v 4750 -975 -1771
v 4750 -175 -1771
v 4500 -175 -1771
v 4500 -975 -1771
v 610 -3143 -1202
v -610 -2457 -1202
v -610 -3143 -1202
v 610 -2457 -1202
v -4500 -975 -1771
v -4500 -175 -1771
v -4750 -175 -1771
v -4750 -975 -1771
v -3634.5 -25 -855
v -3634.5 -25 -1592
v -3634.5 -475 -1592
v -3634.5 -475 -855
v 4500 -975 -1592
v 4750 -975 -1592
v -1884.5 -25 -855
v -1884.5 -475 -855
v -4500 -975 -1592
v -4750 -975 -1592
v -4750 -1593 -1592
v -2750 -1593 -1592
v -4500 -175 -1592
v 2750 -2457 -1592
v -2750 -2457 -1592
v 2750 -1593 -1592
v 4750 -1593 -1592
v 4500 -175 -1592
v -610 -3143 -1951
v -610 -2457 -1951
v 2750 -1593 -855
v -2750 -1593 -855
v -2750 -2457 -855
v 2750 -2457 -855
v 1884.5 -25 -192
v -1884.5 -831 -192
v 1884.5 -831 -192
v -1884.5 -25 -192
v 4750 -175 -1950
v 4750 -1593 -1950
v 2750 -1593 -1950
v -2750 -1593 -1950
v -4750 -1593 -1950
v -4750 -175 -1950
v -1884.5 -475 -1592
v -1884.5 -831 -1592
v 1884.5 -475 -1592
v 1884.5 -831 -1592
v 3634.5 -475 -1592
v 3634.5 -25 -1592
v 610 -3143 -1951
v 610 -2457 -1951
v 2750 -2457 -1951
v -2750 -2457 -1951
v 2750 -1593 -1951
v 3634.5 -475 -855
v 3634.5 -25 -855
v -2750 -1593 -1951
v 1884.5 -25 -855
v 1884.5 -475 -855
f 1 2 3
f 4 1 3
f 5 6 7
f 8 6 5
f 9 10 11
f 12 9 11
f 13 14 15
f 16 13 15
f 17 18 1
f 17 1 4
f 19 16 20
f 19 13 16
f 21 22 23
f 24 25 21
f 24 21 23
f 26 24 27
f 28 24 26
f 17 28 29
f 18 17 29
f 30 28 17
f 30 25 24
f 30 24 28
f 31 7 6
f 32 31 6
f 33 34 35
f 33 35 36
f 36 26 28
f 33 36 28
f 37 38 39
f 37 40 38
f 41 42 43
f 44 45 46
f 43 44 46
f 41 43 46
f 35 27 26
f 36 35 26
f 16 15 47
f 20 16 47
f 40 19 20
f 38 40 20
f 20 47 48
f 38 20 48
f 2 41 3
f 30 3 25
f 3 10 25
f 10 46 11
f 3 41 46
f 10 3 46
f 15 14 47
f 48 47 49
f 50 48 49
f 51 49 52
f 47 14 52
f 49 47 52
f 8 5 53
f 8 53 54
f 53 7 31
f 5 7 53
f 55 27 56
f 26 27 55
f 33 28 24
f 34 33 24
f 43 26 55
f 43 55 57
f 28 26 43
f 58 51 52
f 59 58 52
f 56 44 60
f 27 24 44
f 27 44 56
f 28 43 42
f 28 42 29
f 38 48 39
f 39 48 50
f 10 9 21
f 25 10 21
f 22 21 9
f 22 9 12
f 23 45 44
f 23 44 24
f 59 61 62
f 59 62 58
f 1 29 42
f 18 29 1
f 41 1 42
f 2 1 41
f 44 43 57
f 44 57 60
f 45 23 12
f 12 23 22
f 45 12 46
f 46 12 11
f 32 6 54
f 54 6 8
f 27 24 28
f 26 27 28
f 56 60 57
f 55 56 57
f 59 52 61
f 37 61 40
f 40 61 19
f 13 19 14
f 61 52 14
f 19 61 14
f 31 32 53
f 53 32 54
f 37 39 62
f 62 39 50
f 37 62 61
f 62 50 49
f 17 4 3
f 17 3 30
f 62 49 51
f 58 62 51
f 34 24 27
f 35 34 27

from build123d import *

# Parameters (mm, degrees)
F0_W      = 1418
F0_H      = 358
F1_DEPTH  = 4750
F4_DEPTH  = 1400
F5_DEPTH  = 737
F3_W      = 1220
F3_H      = 686
F6_DEPTH  = 390
F7_DEPTH  = 359
F8_DEPTH  = 359
F10_W     = 250
F10_H     = 179
F11_DEPTH = 800
F3_W_2    = 1750
F3_H_2    = 450
F3_H_3    = 300
F3_H_4    = 150
F12_DEPTH = 737


with BuildPart() as f1:
    # F0 (on Right) → F1 (new body)
    with BuildSketch(Plane.YZ):
        with Locations((-884, -1771)):
            Rectangle(F0_W, F0_H)
    extrude(amount=-F1_DEPTH)


with BuildPart() as f2_1:
    # F2: instance of F1
    add(f1.part.mirror(Plane(origin=(0, -884, -1771), x_dir=(0, 1, 0), z_dir=(1, 0, 0))))


with BuildPart() as f4:
    # F3 (on face) → F4 (new body)
    with BuildSketch(Plane.XY.offset(-1592)):
        Polygon((0, -175), (-1884.5, -175), (-1884.5, -475), (-1884.5, -831), (0, -831), align=None)
        Polygon((1884.5, -475), (1884.5, -25), (-1884.5, -25), (-1884.5, -175), (0, -175), (0, -831), (1884.5, -831), align=None)
    extrude(amount=F4_DEPTH)

    # F3 (on face) → F12 (join)
    with BuildSketch(Plane.XY.offset(-1592)):
        with Locations((2759.5, -250)):
            Rectangle(F3_W_2, F3_H_2)
        with Locations((-2759.5, -325)):
            Rectangle(F3_W_2, F3_H_3)
        with Locations((-2759.5, -100)):
            Rectangle(F3_W_2, F3_H_4)
    extrude(amount=F12_DEPTH)


with BuildPart() as f5:
    # F3 (on face) → F5 (new body)
    with BuildSketch(Plane.XY.offset(-1592)):
        Polygon((2750, -1593), (0, -1593), (-2750, -1593), (-2750, -2457), (-610, -2457), (610, -2457), (2750, -2457), align=None)
    extrude(amount=F5_DEPTH)


with BuildPart() as f6:
    # F3 (on face) → F6 (new body)
    with BuildSketch(Plane.XY.offset(-1592)):
        with Locations((0, -2800)):
            Rectangle(F3_W, F3_H)
    extrude(amount=F6_DEPTH)

    # F3 (on face) → F7 (join)
    with BuildSketch(Plane.XY.offset(-1592)):
        with Locations((0, -2800)):
            Rectangle(F3_W, F3_H)
    extrude(amount=-F7_DEPTH)


with BuildPart() as f1_1:
    add(f1.part)

    add(f2_1.part)  # F8 merges F2_1
    # F3 (on face) → F8 (join)
    with BuildSketch(Plane.XY.offset(-1592)):
        Polygon((2750, -1593), (0, -1593), (-2750, -1593), (-2750, -2457), (-610, -2457), (610, -2457), (2750, -2457), align=None)
    extrude(amount=-F8_DEPTH)

    # F9: union 

    # F10 (on face) → F11 (cut)
    with BuildSketch(Plane(origin=(0, -175, 0), x_dir=(-1, 0, 0), z_dir=(0, 1, 0))):
        with Locations((4625, -1681.5)):
            Rectangle(F10_W, F10_H)
        with Locations((-4625, -1681.5)):
            Rectangle(F10_W, F10_H)
    extrude(amount=-F11_DEPTH, mode=Mode.SUBTRACT)


solid = Compound([f4.part, f5.part, f6.part, f1_1.part])
